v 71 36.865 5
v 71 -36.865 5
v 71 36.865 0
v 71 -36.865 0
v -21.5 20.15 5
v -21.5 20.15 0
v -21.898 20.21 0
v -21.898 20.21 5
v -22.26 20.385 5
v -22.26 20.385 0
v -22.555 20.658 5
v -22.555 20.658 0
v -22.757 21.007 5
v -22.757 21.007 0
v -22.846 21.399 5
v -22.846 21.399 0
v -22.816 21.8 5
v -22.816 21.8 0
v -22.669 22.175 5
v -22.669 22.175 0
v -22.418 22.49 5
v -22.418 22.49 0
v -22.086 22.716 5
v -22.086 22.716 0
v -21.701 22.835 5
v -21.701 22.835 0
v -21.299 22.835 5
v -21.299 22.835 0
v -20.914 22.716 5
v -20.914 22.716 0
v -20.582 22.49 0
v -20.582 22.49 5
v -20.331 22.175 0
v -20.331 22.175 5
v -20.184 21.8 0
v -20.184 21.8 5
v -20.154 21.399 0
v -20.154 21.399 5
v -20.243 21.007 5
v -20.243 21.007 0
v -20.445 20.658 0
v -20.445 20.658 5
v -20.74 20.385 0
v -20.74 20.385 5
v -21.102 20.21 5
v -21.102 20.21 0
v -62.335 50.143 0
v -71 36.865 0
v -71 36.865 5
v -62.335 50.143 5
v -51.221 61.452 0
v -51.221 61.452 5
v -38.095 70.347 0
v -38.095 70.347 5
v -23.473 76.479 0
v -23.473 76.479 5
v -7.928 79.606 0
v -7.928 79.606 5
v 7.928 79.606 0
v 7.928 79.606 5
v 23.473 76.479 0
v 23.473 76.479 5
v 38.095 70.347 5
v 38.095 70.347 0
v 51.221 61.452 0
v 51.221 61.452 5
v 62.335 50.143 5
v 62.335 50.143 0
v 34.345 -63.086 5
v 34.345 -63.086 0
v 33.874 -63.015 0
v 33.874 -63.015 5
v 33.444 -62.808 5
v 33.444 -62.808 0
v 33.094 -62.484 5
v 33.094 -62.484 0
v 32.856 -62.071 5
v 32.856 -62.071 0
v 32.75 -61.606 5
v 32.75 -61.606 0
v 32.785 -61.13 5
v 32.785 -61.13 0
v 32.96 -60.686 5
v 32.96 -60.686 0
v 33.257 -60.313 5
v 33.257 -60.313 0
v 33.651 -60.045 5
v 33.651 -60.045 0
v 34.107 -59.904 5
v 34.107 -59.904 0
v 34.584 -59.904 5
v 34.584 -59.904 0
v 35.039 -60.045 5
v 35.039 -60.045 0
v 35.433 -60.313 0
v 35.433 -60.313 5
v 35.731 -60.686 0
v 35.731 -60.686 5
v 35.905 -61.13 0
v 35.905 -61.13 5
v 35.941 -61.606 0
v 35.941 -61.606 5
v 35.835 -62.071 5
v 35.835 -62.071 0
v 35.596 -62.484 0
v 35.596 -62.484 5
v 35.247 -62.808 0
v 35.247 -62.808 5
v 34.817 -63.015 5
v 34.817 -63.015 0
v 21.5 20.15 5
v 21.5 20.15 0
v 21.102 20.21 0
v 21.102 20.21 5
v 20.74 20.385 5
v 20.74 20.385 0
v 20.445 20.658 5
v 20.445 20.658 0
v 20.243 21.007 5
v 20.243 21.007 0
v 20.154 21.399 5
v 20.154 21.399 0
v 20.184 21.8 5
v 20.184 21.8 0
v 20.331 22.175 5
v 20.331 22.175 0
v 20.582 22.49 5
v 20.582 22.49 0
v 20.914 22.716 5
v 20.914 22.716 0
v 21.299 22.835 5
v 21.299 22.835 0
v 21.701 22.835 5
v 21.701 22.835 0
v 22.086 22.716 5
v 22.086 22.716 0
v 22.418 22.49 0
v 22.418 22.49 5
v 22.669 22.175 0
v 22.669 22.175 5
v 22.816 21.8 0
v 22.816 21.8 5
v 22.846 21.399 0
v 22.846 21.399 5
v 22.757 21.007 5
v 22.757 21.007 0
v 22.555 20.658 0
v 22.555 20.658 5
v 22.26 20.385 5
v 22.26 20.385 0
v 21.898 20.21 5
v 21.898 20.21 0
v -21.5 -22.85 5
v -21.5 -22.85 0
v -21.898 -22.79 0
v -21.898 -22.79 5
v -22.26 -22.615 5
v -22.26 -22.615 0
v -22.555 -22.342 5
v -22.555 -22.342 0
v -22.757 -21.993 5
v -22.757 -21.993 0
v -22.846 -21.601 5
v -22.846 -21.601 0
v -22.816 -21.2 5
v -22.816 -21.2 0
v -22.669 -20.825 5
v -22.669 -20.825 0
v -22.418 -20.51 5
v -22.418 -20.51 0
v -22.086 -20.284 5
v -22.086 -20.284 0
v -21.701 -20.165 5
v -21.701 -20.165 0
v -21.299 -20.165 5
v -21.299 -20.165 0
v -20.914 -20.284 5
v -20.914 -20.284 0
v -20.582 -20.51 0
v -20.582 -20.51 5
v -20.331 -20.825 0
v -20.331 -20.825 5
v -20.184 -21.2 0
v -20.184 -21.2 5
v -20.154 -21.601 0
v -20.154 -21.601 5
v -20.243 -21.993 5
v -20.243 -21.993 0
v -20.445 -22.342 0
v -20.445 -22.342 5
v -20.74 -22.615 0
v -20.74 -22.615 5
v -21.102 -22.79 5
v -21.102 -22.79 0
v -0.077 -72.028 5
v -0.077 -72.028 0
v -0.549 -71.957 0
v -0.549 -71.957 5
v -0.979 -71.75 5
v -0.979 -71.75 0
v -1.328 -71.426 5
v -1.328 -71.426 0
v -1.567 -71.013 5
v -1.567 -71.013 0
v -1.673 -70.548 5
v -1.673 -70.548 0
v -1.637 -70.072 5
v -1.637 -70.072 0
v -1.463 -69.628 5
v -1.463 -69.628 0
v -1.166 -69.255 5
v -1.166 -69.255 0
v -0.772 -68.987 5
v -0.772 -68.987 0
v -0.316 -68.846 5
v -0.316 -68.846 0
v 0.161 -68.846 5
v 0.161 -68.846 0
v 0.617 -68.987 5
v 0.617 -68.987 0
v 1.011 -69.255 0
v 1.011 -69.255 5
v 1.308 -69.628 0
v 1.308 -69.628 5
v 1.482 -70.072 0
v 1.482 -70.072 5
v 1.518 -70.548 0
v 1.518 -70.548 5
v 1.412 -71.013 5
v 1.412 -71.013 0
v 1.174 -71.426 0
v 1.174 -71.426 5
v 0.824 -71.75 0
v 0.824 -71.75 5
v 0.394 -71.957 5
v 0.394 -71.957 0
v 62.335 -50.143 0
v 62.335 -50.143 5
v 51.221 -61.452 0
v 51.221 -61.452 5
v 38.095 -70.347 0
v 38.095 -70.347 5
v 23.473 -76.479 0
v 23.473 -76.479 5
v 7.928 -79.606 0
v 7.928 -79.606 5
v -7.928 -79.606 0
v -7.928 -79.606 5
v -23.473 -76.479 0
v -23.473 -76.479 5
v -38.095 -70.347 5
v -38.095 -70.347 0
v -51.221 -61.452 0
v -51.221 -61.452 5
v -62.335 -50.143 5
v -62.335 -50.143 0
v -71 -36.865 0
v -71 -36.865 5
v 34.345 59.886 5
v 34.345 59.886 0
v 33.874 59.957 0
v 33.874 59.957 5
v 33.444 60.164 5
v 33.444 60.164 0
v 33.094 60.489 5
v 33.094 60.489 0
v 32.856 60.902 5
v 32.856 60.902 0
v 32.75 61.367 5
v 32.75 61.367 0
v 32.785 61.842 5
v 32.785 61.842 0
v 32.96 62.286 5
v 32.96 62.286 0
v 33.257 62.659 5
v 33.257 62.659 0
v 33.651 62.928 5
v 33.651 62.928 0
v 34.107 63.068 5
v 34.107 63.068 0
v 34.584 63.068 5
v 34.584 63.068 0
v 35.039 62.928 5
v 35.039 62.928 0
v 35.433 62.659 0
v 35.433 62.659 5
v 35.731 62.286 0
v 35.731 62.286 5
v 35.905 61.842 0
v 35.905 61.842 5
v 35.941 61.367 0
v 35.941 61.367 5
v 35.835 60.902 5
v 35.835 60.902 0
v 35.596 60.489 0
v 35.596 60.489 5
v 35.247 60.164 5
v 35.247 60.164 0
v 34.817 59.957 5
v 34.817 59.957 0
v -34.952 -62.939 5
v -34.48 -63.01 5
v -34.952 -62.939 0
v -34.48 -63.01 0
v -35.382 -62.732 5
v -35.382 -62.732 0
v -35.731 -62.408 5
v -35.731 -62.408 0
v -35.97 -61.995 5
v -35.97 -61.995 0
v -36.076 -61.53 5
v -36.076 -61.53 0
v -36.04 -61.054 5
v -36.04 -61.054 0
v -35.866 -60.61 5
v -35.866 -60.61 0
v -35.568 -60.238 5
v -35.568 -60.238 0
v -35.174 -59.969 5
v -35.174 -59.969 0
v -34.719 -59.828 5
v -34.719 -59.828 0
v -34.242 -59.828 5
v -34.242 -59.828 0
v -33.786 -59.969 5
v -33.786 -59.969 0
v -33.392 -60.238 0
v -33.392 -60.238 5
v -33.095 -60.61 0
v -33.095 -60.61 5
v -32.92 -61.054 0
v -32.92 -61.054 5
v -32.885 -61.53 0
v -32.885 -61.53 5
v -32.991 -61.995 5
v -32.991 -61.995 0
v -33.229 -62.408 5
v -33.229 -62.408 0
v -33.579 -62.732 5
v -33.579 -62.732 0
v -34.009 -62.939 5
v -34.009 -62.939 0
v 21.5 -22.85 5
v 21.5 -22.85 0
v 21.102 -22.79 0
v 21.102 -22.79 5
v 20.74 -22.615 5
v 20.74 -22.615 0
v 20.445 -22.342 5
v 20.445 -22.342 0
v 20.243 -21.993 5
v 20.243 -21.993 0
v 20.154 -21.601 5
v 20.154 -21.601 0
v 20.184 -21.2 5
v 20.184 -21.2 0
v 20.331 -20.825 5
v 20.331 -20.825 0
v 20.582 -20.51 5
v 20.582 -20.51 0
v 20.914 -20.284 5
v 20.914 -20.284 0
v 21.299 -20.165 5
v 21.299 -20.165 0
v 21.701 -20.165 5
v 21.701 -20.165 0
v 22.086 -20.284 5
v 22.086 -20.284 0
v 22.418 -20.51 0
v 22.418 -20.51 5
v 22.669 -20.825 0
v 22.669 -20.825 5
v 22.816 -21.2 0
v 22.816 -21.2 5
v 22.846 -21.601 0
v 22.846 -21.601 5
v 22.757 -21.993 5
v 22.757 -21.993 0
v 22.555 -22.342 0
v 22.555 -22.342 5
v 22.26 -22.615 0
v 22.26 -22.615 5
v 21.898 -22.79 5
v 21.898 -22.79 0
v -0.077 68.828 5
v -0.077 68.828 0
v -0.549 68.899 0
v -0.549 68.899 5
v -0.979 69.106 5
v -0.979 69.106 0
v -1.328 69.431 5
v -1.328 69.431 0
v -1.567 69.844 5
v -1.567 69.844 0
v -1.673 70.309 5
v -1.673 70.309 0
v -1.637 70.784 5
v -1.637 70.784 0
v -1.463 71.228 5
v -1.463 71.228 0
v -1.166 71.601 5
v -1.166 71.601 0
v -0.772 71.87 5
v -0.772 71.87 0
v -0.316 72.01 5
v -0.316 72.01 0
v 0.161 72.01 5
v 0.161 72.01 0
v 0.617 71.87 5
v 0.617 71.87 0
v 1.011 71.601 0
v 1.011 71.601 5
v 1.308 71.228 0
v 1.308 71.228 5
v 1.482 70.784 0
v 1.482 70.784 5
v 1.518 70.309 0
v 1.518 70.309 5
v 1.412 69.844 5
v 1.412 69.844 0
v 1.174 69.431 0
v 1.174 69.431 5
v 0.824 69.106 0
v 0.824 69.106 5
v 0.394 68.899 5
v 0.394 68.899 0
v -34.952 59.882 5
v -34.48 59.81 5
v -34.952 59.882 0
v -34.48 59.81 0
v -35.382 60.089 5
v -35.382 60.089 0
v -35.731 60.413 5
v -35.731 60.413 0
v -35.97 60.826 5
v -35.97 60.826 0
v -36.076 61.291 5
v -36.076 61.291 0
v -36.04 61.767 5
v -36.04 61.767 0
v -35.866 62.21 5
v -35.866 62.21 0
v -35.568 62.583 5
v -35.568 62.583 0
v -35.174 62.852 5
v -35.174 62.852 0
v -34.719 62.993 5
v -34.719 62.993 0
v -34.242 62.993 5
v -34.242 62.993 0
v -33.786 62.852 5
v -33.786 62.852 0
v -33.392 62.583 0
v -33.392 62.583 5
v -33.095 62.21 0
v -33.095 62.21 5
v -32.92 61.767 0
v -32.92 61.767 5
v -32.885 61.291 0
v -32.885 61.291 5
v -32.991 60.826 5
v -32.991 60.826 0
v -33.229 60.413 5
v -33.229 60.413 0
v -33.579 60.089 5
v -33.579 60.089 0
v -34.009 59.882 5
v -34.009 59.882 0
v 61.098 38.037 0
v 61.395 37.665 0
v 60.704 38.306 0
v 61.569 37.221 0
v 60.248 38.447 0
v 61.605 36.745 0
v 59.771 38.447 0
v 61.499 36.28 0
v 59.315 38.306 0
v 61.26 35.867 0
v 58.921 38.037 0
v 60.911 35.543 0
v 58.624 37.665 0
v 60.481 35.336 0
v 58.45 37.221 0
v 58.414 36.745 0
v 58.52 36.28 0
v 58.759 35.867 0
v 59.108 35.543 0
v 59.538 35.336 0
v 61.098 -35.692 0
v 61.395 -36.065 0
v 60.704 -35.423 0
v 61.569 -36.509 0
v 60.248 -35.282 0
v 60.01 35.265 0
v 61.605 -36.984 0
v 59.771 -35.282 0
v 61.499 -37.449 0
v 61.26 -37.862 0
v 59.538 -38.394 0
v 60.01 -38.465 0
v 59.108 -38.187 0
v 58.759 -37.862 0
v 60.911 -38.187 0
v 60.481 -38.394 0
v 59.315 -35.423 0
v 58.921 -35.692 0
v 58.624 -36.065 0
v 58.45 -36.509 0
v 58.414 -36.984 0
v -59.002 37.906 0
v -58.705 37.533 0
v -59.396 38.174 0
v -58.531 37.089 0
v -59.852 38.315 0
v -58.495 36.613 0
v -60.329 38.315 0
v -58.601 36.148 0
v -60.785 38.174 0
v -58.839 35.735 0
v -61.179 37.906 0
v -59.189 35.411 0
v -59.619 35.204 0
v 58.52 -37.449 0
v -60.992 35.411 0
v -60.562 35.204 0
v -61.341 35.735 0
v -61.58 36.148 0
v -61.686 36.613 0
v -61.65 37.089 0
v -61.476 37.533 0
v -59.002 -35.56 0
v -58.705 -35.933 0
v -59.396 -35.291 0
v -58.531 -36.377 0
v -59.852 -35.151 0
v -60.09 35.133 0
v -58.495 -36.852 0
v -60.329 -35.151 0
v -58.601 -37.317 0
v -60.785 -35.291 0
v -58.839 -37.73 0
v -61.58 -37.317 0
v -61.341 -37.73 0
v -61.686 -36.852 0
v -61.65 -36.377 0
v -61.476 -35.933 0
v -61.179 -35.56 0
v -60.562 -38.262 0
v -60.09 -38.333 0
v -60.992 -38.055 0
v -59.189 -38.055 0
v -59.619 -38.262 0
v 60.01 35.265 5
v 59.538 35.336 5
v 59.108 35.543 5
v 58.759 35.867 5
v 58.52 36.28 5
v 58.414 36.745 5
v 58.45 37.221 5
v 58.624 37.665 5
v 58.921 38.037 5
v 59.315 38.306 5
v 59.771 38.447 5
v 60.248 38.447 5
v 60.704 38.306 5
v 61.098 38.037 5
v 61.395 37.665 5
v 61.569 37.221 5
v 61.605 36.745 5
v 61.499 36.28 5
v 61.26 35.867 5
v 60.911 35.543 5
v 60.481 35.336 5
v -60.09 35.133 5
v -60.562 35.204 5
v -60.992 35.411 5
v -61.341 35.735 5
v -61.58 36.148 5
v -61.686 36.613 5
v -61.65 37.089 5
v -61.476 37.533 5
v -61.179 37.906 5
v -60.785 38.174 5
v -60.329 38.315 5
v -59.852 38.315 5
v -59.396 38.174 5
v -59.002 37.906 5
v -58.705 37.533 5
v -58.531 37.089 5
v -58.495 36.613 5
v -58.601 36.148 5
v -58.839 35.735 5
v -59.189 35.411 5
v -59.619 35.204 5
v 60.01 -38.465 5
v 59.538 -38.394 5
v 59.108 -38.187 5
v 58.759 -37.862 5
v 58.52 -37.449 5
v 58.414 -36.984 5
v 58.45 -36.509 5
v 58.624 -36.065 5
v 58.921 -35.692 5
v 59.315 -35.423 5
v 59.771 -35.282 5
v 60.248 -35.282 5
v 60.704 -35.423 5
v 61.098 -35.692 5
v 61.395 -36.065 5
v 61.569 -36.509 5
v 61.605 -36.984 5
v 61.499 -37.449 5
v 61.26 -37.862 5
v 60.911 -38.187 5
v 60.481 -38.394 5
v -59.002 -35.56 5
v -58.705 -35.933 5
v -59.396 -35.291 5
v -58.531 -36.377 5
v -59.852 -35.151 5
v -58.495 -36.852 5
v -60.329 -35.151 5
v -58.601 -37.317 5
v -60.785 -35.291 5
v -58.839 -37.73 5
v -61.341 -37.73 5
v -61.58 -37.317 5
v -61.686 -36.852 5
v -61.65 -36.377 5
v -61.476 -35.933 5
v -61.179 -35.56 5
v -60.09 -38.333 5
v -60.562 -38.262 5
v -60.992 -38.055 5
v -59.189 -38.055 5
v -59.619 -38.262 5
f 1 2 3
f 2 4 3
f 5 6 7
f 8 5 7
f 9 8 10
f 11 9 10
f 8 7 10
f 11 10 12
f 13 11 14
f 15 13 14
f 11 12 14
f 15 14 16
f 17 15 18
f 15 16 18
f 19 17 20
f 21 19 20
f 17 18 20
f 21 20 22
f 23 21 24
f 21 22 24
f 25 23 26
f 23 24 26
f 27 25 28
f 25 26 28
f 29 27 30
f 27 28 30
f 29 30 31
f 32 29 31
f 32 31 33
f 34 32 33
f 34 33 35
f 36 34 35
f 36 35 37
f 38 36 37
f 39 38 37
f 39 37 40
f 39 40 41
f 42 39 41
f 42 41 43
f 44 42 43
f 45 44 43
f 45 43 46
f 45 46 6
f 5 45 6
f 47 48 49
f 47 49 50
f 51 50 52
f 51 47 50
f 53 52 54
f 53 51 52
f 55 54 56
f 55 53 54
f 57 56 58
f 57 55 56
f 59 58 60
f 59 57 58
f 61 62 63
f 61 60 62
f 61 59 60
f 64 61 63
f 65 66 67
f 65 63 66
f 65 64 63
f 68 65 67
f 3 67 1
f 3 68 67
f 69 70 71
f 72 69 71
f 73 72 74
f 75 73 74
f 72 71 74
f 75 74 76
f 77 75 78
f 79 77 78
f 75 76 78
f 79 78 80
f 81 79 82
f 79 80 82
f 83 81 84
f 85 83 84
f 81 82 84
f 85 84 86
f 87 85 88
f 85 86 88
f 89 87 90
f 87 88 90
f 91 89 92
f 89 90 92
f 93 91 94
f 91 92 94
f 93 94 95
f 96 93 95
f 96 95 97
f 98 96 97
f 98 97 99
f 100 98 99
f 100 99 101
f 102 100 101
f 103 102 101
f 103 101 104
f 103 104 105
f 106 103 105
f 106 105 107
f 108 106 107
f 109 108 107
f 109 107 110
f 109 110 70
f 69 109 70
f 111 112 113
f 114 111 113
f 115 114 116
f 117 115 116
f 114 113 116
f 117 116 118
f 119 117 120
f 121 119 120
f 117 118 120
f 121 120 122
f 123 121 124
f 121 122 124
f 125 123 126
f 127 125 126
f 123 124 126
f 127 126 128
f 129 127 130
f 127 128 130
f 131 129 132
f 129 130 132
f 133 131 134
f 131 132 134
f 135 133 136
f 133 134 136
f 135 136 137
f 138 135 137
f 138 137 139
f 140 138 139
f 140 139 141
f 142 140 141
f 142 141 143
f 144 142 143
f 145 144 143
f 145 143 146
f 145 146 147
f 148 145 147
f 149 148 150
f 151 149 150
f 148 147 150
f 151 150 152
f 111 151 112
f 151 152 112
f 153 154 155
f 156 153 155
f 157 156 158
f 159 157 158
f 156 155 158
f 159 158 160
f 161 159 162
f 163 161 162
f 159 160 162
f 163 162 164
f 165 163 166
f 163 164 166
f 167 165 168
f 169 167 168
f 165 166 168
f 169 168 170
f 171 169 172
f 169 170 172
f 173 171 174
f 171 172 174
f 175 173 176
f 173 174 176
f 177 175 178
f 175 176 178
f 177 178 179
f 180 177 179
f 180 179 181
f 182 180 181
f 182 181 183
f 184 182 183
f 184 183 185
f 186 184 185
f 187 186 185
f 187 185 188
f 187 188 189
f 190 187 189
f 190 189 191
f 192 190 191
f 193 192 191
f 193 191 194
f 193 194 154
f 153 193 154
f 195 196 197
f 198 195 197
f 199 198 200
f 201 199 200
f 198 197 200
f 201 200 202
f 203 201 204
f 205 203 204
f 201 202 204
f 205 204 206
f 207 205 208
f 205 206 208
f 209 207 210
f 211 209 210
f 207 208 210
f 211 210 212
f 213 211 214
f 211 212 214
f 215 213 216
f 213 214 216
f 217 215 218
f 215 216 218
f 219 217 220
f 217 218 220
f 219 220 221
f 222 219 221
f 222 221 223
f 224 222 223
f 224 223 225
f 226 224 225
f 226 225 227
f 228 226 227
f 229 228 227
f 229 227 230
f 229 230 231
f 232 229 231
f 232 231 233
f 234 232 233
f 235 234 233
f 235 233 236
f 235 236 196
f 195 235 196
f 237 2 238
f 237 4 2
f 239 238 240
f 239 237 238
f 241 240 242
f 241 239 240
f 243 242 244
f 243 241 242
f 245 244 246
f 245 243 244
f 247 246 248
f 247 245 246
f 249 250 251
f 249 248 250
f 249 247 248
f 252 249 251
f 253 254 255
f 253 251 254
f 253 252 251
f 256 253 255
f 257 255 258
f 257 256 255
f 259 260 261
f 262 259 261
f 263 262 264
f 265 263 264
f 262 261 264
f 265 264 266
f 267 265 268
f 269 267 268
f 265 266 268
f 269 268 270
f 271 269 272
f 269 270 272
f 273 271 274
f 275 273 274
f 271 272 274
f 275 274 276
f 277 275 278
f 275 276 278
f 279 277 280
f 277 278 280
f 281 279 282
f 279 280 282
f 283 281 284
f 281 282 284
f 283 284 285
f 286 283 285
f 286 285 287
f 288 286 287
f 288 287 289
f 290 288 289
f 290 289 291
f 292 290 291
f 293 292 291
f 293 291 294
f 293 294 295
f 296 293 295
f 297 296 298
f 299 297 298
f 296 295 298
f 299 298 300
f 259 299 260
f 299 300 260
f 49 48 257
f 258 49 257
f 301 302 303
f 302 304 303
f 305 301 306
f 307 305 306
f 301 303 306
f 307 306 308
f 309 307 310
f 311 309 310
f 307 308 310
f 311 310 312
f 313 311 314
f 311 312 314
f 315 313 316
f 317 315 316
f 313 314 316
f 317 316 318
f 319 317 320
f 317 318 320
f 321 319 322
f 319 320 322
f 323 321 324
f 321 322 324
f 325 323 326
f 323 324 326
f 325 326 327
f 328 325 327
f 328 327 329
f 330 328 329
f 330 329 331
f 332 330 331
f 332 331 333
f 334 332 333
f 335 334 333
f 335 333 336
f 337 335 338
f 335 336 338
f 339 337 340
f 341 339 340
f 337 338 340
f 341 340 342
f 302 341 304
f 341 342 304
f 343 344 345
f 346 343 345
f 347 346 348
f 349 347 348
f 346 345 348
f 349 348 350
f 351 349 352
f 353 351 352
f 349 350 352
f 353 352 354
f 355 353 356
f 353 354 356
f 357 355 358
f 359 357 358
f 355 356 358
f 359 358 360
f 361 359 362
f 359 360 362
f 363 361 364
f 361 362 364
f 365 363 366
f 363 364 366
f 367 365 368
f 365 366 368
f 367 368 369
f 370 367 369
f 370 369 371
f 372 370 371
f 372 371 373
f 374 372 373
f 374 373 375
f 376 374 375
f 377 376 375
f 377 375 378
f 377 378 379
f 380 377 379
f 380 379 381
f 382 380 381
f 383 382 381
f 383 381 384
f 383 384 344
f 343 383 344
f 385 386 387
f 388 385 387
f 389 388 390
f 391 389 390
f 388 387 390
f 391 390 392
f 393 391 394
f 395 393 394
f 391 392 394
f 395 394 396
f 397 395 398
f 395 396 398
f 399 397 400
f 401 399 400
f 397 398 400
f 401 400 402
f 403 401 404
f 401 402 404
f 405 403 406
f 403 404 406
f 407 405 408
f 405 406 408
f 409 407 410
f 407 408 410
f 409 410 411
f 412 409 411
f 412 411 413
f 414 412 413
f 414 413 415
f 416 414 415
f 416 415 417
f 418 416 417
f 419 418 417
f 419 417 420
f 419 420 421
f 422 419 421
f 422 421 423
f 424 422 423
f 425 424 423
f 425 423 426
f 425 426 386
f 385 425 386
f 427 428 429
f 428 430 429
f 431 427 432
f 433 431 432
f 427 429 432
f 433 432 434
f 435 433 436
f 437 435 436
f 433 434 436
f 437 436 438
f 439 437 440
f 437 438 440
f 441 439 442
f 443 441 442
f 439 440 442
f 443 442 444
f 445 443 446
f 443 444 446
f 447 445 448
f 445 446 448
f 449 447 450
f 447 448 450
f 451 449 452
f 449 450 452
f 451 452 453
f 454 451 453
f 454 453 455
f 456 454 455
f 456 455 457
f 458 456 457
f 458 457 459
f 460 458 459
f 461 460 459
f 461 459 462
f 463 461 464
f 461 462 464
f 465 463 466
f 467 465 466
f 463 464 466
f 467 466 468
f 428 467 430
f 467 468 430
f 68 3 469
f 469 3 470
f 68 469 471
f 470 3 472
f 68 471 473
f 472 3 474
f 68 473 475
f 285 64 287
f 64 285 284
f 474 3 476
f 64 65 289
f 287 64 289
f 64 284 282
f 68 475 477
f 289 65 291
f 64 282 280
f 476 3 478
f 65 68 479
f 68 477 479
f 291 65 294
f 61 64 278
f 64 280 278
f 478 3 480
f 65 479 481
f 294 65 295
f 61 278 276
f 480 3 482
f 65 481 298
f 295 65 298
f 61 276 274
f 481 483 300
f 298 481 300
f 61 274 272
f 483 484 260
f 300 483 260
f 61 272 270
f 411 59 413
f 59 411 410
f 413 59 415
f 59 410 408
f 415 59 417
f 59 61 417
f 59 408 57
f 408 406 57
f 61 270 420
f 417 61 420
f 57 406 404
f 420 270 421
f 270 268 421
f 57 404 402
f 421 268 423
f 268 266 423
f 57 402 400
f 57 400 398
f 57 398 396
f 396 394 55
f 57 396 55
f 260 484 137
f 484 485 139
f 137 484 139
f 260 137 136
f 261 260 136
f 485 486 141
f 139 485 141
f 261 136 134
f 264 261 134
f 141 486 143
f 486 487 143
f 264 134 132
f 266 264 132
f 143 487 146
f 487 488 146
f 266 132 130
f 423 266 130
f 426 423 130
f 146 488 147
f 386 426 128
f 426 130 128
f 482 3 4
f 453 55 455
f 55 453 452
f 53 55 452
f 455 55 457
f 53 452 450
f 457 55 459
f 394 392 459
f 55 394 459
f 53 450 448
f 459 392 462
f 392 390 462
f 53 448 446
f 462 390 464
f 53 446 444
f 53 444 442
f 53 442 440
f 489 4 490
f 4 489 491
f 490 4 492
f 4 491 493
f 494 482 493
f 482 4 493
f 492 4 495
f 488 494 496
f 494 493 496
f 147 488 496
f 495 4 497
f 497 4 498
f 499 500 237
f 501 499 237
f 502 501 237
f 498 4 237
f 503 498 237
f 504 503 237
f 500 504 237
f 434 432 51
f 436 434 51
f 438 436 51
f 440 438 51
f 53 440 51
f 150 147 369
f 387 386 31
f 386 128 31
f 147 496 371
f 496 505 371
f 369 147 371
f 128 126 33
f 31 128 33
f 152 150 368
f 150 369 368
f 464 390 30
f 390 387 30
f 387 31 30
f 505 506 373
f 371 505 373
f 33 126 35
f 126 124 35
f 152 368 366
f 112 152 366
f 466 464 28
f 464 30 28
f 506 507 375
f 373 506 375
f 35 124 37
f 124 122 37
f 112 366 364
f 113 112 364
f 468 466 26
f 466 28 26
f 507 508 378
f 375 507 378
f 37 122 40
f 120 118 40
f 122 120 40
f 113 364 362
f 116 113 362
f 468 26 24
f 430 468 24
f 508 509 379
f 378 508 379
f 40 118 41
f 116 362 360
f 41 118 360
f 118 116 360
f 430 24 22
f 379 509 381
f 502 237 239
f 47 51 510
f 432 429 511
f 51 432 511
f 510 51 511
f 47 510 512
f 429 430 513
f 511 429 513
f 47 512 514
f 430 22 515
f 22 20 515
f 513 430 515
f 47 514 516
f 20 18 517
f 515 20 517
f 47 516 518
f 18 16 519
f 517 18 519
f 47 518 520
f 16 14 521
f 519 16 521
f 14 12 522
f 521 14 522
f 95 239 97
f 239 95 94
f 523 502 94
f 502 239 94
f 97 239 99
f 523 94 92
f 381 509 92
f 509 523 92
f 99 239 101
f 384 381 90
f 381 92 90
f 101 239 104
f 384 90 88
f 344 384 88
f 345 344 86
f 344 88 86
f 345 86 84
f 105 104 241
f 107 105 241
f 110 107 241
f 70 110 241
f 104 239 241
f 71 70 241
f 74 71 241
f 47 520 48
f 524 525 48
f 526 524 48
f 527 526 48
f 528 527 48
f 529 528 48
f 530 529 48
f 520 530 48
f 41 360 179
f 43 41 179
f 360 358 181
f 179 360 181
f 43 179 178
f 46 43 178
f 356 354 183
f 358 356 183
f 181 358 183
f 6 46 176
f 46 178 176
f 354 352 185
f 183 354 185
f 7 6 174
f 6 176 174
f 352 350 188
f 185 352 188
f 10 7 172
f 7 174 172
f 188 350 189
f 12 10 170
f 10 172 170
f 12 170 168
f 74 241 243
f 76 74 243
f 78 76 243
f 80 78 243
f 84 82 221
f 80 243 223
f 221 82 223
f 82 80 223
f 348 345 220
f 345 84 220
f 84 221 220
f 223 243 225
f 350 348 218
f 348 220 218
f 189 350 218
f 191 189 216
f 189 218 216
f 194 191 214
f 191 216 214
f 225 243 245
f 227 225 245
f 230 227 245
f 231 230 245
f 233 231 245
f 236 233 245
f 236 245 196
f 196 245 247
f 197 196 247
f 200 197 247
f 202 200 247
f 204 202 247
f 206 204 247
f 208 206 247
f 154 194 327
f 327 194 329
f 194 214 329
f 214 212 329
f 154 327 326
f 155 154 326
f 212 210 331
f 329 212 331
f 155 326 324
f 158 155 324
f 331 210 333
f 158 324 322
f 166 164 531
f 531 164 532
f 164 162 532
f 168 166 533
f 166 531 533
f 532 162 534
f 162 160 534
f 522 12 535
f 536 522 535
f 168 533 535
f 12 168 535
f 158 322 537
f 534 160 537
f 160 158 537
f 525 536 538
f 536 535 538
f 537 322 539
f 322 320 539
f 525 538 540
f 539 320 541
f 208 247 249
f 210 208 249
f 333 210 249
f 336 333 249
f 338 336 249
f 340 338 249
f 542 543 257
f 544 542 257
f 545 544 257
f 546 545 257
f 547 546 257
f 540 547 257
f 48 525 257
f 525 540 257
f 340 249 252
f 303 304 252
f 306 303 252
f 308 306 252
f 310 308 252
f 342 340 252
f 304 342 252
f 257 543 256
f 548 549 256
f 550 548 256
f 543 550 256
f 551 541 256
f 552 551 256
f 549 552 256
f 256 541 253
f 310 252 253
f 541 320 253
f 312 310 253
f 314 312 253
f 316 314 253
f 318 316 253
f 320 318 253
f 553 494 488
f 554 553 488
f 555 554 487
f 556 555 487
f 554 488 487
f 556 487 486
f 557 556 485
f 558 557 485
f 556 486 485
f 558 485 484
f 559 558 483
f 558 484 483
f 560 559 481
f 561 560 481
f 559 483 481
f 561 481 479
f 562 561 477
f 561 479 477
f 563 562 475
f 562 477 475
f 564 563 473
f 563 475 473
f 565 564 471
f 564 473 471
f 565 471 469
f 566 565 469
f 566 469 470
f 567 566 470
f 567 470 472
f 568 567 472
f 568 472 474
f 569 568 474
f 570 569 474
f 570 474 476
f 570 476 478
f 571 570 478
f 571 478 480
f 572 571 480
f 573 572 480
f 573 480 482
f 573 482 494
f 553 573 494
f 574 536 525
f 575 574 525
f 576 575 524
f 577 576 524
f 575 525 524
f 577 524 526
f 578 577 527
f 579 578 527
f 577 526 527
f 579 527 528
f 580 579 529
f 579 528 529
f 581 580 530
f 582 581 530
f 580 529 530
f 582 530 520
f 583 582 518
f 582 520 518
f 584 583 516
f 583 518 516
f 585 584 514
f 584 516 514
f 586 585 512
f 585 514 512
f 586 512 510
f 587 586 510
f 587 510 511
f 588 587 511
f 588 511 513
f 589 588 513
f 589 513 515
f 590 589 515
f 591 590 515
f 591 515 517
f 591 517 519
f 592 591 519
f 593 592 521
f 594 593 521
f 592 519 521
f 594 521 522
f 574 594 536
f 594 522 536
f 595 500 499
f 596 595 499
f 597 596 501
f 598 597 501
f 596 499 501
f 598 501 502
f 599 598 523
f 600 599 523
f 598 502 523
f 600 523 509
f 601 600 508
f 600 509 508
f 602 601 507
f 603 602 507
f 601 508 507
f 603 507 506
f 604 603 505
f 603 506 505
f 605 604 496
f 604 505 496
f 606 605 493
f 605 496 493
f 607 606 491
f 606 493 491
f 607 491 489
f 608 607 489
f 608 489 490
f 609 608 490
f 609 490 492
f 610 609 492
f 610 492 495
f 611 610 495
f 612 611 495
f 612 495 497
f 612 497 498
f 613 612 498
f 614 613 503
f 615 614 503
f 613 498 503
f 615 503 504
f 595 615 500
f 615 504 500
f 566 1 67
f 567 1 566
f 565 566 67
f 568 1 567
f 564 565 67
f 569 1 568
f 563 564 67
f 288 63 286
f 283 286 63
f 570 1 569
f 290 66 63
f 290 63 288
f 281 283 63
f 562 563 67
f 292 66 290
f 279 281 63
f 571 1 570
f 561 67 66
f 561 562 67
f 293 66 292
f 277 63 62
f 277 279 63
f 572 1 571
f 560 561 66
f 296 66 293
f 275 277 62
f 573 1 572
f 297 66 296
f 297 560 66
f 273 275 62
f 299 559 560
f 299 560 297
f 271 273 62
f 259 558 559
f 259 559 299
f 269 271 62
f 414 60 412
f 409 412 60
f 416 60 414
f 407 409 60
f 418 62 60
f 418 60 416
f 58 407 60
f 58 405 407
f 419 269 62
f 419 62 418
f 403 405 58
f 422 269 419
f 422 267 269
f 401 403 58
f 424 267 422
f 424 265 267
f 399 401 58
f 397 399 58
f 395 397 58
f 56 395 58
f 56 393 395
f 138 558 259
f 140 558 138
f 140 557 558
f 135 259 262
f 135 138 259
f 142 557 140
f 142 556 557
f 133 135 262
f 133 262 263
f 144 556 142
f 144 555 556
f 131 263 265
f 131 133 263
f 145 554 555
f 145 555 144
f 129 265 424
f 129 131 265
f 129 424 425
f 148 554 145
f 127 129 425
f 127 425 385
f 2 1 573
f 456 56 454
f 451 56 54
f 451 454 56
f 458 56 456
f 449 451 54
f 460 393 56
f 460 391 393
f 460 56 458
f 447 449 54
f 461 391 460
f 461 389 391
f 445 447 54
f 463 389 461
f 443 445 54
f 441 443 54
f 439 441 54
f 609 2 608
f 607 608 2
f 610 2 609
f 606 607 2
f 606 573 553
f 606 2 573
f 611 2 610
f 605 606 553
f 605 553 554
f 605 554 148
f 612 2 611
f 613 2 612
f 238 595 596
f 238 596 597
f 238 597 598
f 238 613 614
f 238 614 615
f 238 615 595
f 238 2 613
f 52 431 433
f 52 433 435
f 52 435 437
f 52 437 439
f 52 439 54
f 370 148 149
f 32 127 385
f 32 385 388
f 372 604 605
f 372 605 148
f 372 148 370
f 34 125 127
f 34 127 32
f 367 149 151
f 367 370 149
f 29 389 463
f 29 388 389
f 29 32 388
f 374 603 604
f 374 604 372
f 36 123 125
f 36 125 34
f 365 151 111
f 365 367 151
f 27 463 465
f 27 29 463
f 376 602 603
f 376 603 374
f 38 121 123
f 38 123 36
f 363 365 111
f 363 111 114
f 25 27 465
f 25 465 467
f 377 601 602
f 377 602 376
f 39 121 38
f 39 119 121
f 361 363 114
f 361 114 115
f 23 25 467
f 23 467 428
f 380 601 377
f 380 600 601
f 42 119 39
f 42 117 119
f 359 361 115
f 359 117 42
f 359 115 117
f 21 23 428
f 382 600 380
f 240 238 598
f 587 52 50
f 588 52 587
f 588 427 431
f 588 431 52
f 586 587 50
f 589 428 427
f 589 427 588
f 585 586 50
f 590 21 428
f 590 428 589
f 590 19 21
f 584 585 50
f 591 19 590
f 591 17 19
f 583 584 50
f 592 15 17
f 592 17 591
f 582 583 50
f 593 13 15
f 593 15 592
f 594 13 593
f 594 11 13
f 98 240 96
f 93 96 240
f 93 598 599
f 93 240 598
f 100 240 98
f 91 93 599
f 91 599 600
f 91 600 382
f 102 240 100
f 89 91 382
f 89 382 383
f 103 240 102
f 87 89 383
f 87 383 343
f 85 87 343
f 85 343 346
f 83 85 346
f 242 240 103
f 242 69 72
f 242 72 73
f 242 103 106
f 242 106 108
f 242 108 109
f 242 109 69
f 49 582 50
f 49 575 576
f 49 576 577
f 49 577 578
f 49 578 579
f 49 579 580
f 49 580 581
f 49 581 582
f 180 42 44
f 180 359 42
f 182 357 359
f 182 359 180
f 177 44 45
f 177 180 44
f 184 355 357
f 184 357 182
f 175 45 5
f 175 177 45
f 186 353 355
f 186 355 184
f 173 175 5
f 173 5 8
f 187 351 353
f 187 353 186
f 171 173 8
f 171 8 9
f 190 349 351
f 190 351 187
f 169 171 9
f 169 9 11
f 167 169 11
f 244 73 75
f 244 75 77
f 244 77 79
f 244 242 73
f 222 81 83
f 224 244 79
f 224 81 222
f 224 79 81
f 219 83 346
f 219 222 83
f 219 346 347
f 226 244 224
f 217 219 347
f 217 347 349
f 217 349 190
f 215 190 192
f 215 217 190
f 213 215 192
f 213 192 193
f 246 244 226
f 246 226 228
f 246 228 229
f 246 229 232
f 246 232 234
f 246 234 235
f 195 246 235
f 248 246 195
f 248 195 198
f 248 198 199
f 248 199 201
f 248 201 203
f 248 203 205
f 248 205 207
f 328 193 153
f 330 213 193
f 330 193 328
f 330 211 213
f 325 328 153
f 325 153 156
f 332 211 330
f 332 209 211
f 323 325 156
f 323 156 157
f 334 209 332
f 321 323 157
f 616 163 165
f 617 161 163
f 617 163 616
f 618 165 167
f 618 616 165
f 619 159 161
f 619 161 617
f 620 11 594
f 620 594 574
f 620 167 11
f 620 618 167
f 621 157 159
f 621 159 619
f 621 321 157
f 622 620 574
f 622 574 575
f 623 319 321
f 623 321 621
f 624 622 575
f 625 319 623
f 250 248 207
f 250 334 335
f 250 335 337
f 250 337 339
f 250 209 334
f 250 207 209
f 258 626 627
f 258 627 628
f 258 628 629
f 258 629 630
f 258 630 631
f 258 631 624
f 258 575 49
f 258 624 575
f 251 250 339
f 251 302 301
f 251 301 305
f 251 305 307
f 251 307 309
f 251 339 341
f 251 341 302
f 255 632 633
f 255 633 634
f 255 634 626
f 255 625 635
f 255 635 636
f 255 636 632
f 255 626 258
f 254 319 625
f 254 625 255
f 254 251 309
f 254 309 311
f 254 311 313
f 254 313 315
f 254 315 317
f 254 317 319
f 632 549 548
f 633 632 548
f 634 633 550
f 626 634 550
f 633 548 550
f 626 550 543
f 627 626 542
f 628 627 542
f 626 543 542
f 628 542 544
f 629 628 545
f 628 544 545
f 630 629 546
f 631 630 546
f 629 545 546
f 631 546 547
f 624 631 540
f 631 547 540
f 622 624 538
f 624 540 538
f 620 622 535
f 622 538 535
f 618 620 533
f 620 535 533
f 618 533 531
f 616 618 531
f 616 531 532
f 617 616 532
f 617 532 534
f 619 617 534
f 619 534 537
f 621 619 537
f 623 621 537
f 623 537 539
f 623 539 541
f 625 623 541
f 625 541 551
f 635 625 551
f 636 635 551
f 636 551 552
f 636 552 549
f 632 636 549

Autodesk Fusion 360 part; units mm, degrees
sketch "Sketch1" plane through (0, 0, 0) normal (0, 0, 1) x (-1, 0, 0)
  line L0 (-80, 0) -> (80, 0) construction
  line L1 (-71, -12.5) -> (-10, -12.5)
  line L2 (-10, -12.5) -> (-10, 12.5)
  line L3 (-10, 12.5) -> (-71, 12.5)
  line L4 (-71, 12.5) -> (-71, -12.5)
  line L5 (-71, -36.8646) -> (-71, 36.8646)
  line L6 (0, -80) -> (0, 80) construction
  line L7 (10, -12.5) -> (10, 12.5)
  line L8 (10, 12.5) -> (71, 12.5)
  line L9 (71, -12.5) -> (10, -12.5)
  line L10 (71, 12.5) -> (71, -12.5)
  line L11 (71, -36.8646) -> (71, 36.8646)
  arc A0 (71, 36.8646) -> (-71, 36.8646) centre (0, 0) ccw
  arc A1 (-71, -36.8646) -> (71, -36.8646) centre (0, 0) ccw
  dimension "d6" = 160
  dimension "d7" = 61
  dimension "d8" = 25
  dimension "d9" = 10
  dimension "d10" = 71
extrude "Extrude3" add sketch "Sketch1" along normal blind 5
sketch "Sketch3" plane through (0, 0, 5) normal (0, 0, 1) x (-1, 0, 0)
  line L0 (-71, 36.8646) -> (-71, 12.5)
  line L1 (-71, 12.5) -> (-10, 12.5)
  line L2 (-10, 12.5) -> (-10, -12.5)
  line L3 (-10, -12.5) -> (-71, -12.5)
  line L4 (-71, -12.5) -> (-71, -36.8646)
  arc A0 (-71, -36.8646) -> (71, -36.8646) centre (0, 0) ccw
  line L5 (71, -36.8646) -> (71, -12.5)
  line L6 (71, -12.5) -> (10, -12.5)
  line L7 (10, -12.5) -> (10, 12.5)
  line L8 (10, 12.5) -> (71, 12.5)
  line L9 (71, 12.5) -> (71, 36.8646)
  arc A1 (71, 36.8646) -> (-71, 36.8646) centre (0, 0) ccw
  line L10 (-70, 0) -> (70, 0) construction
  line L11 (0, 80) -> (0, -80) construction
  line L12 (21.5, -21.5) -> (-21.5, -21.5)
  line L13 (-21.5, -21.5) -> (-21.5, 21.5)
  line L14 (-21.5, 21.5) -> (21.5, 21.5)
  line L15 (21.5, 21.5) -> (21.5, -21.5)
  point P0 (-60.0095, 36.8646)
  point P1 (-34.3452, 61.4862)
  point P2 (0.0774, 70.4282)
  point P3 (34.4802, 61.4105)
  point P4 (60.0904, 36.7327)
  point P5 (-60.0095, -36.8646)
  point P6 (-34.3452, -61.4862)
  point P7 (0.0774, -70.4282)
  point P8 (34.4802, -61.4105)
  point P9 (60.0904, -36.7327)
  point P10 (21.5, -21.5)
  point P11 (-21.5, -21.5)
  point P12 (21.5, 21.5)
  point P13 (-21.5, 21.5)
  dimension "d20" = -117
  dimension "d25" = 43
  dimension "d26" = 43
hole "Hole2" at (-60.0904, 36.7327, 5) at (-34.4802, 61.4105, 5) at (-0.0774, 70.4282, 5) at (34.3452, 61.4862, 5) at (60.0095, 36.8646, 5) at (-60.0904, -36.7327, 5) at (-34.4802, -61.4105, 5) at (-0.0774, -70.4282, 5) at (34.3452, -61.4862, 5) at (60.0095, -36.8646, 5) direction (0, 0, -1) diameter 3.2 end through all
hole "Hole3" at (-21.5, 21.5, 5) at (21.5, 21.5, 5) at (-21.5, -21.5, 5) at (21.5, -21.5, 5) direction (0, 0, -1) diameter 2.7 end through all
equation "chasis_diameter = 160 mm"
equation "main_layer_thickness = 30 mm"
equation "motor_L = 21 mm"
equation "total_motor_body_length = 61 mm"
equation "standoff_height = 50 mm"
equation "d6 = chasis_diameter"
